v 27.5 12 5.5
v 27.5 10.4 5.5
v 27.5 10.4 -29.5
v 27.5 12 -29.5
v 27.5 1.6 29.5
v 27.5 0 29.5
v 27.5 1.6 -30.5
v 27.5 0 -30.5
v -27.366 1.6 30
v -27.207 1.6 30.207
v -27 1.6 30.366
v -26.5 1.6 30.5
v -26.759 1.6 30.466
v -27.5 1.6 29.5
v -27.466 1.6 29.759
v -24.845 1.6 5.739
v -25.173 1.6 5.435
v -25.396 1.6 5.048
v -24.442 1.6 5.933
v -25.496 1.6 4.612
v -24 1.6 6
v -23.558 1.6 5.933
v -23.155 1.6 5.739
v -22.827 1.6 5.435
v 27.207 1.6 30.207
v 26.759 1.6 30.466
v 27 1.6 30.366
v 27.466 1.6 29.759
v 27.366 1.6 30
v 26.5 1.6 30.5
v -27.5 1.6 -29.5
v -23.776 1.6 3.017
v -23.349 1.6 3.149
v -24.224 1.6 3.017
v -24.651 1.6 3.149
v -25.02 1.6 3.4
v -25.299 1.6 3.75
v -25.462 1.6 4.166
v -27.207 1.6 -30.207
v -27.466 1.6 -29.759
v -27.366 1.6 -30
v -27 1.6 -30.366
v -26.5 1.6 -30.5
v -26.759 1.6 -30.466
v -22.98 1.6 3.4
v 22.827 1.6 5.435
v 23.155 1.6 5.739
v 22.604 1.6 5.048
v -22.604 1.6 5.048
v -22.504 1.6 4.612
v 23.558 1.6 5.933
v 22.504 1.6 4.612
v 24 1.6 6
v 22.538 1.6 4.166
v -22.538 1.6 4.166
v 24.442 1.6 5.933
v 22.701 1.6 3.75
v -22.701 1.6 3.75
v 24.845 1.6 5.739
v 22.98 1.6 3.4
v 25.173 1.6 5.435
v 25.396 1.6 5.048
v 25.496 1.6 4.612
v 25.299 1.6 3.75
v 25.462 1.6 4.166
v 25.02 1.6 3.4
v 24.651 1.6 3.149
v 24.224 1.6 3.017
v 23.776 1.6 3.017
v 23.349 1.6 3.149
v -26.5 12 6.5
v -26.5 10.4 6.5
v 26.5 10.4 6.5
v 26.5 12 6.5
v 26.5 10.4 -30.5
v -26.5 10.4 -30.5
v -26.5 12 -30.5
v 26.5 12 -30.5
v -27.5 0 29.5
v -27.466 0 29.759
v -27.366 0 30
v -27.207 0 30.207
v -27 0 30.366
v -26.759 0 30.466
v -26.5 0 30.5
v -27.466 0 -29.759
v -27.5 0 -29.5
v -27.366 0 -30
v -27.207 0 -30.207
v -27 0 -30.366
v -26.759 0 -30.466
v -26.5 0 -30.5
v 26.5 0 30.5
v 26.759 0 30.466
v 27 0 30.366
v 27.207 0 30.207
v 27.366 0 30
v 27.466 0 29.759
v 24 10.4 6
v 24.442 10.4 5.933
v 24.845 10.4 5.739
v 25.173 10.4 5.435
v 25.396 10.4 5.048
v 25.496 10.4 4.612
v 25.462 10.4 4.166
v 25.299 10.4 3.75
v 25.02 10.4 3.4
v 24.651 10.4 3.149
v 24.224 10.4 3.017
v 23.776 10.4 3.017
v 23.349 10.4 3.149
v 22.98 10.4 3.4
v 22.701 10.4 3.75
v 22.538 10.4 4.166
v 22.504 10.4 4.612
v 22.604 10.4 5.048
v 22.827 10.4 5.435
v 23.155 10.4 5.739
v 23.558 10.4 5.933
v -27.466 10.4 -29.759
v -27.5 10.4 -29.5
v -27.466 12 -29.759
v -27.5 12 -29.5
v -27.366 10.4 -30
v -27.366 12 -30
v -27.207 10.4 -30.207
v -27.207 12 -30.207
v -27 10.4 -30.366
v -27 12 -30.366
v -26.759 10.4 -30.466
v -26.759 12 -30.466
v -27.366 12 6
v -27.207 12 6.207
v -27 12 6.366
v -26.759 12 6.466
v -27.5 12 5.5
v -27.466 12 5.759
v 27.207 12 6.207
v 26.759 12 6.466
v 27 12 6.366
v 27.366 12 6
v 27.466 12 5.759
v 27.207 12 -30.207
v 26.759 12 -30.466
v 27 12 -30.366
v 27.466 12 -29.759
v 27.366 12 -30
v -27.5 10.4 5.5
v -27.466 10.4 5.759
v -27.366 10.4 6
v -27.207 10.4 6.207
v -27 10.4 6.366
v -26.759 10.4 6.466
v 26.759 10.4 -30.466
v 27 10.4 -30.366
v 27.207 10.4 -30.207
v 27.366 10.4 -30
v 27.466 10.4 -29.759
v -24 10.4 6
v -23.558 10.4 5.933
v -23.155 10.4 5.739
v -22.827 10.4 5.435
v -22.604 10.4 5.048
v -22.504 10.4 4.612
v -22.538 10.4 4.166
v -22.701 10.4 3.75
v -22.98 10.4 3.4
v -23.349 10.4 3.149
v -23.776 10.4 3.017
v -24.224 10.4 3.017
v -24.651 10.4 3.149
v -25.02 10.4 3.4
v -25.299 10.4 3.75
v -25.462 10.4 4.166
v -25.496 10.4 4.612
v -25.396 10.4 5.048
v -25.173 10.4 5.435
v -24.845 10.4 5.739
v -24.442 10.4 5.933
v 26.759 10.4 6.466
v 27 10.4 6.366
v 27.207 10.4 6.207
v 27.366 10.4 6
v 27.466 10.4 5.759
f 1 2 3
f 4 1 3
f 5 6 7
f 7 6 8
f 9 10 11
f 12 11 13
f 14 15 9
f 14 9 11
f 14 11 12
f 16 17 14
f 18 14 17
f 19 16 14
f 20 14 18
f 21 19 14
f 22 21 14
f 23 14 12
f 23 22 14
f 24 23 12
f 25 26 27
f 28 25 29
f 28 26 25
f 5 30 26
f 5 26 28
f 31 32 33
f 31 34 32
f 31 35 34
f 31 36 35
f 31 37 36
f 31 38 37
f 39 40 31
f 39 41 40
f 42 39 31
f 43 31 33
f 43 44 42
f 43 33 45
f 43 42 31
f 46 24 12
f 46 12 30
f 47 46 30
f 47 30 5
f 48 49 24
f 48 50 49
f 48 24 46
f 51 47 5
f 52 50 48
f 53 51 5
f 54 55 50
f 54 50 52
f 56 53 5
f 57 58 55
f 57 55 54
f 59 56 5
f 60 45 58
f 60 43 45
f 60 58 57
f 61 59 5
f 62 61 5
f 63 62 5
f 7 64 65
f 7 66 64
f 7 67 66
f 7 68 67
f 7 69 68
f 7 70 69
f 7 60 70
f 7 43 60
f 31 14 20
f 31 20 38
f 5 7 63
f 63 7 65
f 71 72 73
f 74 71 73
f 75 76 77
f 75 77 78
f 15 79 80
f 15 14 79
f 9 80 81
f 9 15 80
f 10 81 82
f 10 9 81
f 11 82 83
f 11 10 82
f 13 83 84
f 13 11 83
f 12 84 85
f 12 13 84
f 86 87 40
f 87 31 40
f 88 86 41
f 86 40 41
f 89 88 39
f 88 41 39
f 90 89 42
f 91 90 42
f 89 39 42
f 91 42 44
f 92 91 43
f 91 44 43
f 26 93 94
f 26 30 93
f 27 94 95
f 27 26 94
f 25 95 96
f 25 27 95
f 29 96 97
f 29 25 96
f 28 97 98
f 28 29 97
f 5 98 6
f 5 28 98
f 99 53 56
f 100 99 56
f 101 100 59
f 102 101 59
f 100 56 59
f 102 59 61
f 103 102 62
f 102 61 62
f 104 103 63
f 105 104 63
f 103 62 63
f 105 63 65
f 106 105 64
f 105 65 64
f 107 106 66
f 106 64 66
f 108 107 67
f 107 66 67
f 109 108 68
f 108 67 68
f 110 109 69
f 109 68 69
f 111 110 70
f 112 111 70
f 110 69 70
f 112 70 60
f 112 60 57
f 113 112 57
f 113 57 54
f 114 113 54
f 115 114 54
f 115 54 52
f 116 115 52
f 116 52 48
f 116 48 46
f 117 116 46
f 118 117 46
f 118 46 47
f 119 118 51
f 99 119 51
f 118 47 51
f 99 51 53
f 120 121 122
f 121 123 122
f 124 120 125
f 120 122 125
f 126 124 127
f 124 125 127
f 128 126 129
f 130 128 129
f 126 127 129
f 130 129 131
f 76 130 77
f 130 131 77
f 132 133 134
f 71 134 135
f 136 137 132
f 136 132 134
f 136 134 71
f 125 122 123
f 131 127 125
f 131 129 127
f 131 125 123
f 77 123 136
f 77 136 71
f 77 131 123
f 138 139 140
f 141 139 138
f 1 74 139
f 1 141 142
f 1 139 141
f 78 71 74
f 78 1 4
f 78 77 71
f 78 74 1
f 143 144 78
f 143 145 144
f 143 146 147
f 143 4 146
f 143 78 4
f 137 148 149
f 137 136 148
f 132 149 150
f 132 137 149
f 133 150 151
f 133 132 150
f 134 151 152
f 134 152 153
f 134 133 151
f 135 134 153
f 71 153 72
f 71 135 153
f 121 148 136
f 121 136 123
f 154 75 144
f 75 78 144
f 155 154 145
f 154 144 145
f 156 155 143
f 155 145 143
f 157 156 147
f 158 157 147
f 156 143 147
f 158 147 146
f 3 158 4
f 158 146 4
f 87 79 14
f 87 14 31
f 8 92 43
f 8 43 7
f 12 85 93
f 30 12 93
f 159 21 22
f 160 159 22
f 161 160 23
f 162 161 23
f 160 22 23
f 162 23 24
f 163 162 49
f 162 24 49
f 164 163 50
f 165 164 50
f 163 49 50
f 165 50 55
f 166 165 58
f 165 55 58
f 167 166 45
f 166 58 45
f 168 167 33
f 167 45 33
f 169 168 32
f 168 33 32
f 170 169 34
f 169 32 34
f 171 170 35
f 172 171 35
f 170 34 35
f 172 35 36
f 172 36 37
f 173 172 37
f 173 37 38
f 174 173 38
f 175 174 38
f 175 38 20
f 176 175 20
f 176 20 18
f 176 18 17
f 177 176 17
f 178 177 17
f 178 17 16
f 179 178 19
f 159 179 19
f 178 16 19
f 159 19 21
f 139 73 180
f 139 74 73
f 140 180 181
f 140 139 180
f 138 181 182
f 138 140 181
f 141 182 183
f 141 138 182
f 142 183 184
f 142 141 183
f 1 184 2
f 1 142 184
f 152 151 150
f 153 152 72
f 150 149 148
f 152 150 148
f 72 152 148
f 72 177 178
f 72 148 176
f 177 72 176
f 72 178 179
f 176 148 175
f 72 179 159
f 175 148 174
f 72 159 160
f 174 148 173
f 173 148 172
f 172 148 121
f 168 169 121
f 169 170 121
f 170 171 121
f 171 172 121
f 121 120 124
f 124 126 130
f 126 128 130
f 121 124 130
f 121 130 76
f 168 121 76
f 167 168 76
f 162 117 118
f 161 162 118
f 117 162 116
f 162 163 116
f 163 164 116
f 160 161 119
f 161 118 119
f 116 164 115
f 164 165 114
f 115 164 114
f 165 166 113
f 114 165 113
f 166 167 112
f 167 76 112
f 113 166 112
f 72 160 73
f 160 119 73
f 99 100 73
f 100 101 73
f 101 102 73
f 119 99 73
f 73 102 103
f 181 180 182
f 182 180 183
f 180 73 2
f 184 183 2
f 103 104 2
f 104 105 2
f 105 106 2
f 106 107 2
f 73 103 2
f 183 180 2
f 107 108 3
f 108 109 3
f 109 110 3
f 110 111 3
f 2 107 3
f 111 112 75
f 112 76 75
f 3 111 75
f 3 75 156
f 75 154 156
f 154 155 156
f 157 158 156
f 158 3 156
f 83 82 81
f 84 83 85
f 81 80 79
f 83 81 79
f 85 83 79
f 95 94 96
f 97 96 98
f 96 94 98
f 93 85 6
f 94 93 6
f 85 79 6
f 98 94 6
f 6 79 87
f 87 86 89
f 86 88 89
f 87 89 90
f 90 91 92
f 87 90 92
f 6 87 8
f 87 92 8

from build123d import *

# Parameters (mm, degrees)
SKETCH1_W           = 55
SKETCH1_H           = 61
BOSS_EXTRUDE1_DEPTH = 1.6
SKETCH2_R           = 1.5
BOSS_EXTRUDE2_DEPTH = 8.8
SKETCH3_W           = 55
SKETCH3_H           = 37
BOSS_EXTRUDE3_DEPTH = 1.6
FILLET1_R           = 1


with BuildPart() as part:
    # Sketch1 → Boss-Extrude1 (new body)
    with BuildSketch(Plane(origin=(0, 0, 0), x_dir=(1, 0, 0), z_dir=(0, 1, 0))):
        Rectangle(SKETCH1_W, SKETCH1_H)
    extrude(amount=BOSS_EXTRUDE1_DEPTH)

    # Sketch2 → Boss-Extrude2 (add)
    with BuildSketch(Plane(origin=(0, 1.6, 0), x_dir=(1, 0, 0), z_dir=(0, 1, 0))):
        with Locations(Location((-24, -4.5, 0), (0, 0, 270))):
            Circle(SKETCH2_R)
        with Locations(Location((24, -4.5, 0), (0, 0, 270))):
            Circle(SKETCH2_R)
    extrude(amount=BOSS_EXTRUDE2_DEPTH)

    # Sketch3 → Boss-Extrude3 (add)
    with BuildSketch(Plane(origin=(0, 10.4, 0), x_dir=(1, 0, 0), z_dir=(0, 1, 0))):
        with Locations((0, 12)):
            Rectangle(SKETCH3_W, SKETCH3_H)
    extrude(amount=BOSS_EXTRUDE3_DEPTH)

    # Fillet1
    fillet1_edges = [part.edges().sort_by_distance(p)[0] for p in [
        (-27.5, 11.2, -30.5),
        (-27.5, 11.2, 6.5),
        (27.5, 11.2, 6.5),
        (27.5, 11.2, -30.5),
        (-27.5, 0.8, -30.5),
        (27.5, 0.8, 30.5),
        (-27.5, 0.8, 30.5),
    ]]
    fillet(fillet1_edges, radius=FILLET1_R)


solid = part.part
